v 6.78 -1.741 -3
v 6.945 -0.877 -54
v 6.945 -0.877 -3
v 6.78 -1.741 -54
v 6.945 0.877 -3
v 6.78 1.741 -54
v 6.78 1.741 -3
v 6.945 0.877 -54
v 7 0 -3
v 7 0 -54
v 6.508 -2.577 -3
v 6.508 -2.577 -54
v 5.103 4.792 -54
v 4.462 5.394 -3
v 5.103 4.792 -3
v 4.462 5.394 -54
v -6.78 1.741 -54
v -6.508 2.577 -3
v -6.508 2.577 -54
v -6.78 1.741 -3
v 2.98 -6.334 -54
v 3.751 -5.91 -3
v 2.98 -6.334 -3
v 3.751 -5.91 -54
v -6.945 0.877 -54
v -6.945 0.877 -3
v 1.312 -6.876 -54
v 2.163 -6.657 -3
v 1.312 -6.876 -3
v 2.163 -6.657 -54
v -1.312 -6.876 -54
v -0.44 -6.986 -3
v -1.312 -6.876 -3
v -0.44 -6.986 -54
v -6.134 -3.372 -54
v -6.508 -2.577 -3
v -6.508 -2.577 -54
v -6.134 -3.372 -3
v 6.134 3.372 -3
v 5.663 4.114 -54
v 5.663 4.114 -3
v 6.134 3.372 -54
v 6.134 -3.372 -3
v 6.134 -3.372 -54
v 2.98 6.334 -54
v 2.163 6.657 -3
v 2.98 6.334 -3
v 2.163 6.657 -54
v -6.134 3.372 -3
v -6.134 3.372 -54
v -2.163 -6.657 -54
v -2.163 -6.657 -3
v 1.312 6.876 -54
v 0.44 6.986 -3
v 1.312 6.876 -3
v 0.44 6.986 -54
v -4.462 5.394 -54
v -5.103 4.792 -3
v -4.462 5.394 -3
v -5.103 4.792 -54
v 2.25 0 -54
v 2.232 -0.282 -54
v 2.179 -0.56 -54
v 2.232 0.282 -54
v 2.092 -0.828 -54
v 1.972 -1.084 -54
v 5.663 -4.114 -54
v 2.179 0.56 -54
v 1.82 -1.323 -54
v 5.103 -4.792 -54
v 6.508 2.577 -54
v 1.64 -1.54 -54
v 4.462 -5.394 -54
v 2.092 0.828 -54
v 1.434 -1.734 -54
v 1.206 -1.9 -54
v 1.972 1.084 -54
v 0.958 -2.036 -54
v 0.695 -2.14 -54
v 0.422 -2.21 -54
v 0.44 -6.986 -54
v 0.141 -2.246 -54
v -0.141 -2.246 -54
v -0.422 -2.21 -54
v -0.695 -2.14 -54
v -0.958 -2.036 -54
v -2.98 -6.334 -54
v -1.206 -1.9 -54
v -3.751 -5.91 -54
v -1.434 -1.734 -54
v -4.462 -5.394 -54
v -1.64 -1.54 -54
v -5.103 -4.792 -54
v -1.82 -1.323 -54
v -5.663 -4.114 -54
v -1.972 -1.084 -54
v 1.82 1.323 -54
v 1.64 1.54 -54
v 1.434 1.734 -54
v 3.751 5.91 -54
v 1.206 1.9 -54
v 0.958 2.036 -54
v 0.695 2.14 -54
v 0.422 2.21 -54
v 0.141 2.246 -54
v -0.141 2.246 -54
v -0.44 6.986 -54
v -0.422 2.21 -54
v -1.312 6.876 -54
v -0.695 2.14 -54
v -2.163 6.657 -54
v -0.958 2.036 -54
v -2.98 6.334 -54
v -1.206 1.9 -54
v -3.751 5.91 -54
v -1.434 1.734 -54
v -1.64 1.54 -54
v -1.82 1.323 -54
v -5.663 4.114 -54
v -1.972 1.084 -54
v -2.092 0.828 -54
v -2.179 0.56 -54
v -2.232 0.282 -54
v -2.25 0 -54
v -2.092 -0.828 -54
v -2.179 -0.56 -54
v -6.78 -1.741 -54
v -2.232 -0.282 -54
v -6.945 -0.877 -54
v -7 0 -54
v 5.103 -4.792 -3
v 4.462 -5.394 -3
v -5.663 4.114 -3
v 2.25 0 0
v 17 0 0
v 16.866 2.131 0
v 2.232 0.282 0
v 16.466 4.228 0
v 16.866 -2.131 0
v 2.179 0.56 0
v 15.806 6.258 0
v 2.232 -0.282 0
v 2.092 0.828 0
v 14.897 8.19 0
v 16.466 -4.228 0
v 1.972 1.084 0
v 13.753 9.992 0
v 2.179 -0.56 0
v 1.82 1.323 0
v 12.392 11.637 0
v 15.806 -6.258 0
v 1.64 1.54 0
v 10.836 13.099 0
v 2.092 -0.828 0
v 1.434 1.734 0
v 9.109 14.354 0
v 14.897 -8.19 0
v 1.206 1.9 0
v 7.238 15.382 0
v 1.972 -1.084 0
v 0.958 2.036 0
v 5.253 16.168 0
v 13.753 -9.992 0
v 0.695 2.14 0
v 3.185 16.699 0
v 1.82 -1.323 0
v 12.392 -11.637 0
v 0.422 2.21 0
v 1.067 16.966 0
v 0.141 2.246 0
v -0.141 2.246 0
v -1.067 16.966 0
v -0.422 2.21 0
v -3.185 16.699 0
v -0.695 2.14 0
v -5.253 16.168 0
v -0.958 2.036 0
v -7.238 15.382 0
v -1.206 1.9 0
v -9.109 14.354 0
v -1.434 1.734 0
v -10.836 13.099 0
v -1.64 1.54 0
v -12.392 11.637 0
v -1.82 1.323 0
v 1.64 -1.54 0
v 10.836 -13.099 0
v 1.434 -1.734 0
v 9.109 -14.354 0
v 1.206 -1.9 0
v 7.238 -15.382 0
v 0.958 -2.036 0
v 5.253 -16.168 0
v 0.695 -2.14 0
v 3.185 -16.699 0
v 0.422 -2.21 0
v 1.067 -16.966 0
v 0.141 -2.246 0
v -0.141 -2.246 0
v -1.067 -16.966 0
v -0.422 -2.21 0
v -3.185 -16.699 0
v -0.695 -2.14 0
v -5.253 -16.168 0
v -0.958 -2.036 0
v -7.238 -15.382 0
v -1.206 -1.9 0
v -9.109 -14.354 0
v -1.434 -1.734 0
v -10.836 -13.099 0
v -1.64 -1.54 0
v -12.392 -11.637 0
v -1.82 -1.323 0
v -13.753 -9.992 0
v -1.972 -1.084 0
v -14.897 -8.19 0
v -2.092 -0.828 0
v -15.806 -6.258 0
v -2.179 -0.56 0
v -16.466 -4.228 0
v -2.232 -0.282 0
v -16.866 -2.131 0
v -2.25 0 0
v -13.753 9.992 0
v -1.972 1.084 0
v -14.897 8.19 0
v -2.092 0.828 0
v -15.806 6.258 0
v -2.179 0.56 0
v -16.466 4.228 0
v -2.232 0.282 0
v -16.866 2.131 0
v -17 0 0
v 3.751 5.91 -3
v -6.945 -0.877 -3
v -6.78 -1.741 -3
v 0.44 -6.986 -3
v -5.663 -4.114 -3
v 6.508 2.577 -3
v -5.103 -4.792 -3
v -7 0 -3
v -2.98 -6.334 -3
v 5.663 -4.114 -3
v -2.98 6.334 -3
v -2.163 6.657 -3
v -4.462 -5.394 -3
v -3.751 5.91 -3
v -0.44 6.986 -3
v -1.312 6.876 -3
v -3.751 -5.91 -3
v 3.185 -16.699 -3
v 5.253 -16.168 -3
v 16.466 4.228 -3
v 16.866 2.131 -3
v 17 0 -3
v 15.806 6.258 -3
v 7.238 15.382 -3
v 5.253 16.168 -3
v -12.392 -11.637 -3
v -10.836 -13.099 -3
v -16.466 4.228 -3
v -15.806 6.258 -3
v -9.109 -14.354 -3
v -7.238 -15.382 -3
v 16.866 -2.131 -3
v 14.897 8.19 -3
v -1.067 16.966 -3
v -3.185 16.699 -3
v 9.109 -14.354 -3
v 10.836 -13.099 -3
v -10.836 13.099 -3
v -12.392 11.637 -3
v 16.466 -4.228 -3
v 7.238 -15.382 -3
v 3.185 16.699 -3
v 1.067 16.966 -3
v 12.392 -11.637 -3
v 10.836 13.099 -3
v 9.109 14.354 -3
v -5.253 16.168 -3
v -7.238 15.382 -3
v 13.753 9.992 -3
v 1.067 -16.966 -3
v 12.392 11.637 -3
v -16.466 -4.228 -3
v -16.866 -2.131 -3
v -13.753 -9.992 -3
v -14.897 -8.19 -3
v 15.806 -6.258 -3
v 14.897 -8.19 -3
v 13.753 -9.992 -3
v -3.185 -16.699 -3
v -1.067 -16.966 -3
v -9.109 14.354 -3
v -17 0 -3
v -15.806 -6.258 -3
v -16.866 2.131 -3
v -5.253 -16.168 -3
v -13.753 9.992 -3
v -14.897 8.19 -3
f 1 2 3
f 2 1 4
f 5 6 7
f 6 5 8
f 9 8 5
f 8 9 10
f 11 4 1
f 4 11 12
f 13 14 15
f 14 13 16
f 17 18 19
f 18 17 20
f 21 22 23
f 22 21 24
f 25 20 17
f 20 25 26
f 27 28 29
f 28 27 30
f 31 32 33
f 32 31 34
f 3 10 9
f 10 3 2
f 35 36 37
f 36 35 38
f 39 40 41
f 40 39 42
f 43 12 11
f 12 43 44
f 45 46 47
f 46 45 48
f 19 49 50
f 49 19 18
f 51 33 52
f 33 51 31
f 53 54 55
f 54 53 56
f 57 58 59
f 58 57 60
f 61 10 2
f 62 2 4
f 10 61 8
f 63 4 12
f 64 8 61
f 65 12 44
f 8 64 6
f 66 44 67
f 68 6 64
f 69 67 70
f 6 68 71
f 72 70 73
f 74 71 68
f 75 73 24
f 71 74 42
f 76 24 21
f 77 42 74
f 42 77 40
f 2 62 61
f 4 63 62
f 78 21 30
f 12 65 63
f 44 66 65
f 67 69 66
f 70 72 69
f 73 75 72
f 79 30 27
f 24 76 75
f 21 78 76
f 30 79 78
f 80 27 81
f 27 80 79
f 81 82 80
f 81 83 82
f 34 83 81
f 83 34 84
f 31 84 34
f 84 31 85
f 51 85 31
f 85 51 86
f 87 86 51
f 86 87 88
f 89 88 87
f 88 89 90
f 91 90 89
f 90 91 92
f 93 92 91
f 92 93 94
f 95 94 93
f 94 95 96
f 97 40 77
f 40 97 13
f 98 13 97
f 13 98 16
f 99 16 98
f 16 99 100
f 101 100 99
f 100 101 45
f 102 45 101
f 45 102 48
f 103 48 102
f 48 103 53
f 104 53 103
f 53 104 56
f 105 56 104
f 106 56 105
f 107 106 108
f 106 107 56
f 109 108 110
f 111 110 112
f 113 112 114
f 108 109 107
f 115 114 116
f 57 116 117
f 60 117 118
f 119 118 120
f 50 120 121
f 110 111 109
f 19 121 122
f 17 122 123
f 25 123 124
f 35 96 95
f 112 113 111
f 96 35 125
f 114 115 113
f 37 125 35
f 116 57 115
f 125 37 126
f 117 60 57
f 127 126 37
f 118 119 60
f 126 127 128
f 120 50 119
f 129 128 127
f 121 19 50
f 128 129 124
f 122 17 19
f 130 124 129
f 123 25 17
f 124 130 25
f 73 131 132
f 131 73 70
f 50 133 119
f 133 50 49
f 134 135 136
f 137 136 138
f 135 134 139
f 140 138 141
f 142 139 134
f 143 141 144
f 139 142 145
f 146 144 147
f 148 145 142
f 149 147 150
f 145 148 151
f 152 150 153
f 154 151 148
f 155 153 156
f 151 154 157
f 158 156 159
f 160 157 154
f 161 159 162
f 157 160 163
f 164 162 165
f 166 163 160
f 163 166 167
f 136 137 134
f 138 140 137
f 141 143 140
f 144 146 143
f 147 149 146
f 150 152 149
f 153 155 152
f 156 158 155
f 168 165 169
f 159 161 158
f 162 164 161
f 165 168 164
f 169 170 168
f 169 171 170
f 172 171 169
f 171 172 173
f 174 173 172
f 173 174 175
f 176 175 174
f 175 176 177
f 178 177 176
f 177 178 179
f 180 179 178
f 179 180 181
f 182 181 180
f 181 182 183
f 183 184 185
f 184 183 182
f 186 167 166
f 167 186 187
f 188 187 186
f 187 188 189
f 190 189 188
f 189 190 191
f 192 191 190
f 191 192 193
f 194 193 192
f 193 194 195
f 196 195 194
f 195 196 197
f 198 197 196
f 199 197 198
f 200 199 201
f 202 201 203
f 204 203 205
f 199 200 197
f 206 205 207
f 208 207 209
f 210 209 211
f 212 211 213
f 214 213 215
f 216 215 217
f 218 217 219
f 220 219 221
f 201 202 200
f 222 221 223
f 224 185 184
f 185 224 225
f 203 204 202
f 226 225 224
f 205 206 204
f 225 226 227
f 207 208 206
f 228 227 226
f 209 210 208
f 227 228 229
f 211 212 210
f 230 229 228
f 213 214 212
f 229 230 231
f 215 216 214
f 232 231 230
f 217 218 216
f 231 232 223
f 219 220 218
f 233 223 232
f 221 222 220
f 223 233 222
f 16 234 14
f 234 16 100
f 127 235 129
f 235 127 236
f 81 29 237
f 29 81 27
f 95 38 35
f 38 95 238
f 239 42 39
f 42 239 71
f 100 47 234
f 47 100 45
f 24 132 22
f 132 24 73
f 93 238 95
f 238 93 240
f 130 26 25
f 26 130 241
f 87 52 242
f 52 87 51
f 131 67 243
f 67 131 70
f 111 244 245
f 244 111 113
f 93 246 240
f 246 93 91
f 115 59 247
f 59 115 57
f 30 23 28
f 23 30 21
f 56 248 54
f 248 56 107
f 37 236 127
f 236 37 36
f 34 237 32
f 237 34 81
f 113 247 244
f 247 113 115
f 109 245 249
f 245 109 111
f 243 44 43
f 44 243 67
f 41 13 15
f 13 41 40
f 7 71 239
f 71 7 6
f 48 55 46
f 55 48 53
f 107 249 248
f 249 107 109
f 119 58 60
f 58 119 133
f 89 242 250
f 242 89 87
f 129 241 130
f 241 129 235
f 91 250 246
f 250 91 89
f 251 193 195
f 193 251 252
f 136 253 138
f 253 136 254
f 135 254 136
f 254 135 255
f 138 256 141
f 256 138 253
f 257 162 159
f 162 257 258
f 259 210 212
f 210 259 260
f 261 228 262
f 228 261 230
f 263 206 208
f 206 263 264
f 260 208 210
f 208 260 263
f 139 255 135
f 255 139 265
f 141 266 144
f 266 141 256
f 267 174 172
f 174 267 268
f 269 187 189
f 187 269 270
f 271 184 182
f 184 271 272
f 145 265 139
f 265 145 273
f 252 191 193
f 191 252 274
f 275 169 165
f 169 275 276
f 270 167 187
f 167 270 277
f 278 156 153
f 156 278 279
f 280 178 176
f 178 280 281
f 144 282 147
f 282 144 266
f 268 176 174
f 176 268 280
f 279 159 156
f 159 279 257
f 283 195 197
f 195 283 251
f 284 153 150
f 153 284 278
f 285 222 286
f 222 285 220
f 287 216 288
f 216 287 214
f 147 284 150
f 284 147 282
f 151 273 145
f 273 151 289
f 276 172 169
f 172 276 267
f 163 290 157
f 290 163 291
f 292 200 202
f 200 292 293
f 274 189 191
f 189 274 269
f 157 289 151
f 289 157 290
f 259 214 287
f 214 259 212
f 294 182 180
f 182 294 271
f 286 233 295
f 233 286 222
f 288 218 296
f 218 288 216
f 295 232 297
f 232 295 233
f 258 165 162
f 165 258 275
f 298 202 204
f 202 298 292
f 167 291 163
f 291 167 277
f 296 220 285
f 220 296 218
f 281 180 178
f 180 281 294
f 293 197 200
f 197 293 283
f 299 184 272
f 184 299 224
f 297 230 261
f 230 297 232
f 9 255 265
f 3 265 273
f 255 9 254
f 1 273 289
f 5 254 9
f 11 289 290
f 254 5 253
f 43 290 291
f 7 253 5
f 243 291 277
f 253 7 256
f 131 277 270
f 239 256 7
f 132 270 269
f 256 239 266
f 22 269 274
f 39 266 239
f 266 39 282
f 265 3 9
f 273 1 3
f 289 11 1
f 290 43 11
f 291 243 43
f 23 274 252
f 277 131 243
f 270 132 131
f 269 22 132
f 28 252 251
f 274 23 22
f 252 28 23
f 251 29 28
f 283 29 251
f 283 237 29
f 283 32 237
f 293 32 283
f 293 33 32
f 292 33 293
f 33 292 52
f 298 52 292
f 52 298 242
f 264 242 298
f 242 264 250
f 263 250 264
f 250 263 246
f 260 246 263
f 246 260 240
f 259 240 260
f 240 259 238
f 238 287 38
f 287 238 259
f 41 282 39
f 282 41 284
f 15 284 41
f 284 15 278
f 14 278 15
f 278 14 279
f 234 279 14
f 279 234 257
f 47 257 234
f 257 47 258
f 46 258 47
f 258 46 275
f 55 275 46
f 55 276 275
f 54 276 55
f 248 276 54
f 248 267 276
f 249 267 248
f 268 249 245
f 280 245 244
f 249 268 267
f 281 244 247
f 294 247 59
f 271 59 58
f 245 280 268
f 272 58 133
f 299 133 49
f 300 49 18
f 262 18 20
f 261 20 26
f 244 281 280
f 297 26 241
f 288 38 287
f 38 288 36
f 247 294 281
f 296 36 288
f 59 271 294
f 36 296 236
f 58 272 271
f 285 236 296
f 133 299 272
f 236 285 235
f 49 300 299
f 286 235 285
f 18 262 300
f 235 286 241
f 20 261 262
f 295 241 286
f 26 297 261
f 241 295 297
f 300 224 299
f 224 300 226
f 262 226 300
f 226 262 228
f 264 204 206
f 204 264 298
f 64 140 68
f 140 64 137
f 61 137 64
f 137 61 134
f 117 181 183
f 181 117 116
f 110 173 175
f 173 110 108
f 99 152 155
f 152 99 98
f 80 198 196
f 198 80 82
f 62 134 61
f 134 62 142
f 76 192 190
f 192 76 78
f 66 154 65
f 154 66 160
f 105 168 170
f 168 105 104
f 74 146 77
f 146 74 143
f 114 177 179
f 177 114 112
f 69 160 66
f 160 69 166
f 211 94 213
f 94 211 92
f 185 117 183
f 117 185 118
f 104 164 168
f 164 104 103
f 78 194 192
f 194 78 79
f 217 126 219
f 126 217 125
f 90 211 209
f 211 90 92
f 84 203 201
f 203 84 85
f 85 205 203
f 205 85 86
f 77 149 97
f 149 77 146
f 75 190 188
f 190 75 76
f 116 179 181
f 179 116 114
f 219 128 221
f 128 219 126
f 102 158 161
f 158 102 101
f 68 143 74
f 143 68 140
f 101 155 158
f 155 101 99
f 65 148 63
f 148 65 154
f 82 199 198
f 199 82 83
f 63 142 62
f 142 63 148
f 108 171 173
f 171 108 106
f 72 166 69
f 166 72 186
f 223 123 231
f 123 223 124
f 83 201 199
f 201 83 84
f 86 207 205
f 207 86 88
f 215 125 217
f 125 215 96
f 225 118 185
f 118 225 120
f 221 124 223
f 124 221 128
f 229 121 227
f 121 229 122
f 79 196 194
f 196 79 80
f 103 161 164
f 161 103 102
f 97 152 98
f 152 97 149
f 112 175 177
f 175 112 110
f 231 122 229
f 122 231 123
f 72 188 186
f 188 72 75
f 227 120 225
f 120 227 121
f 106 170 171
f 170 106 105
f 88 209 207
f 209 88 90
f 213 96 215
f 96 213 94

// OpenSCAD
$fn = 50;


difference() {
	union() {
		translate(v = [0, 0, -54.0000000000]) {
			cylinder(h = 54, r = 7.0000000000);
		}
		translate(v = [0, 0, -3.0000000000]) {
			cylinder(h = 3, r = 17.0000000000);
		}
	}
	union() {
		#translate(v = [0, 0, -54]) {
			cylinder(h = 54, r = 2.2500000000);
		}
	}
}
